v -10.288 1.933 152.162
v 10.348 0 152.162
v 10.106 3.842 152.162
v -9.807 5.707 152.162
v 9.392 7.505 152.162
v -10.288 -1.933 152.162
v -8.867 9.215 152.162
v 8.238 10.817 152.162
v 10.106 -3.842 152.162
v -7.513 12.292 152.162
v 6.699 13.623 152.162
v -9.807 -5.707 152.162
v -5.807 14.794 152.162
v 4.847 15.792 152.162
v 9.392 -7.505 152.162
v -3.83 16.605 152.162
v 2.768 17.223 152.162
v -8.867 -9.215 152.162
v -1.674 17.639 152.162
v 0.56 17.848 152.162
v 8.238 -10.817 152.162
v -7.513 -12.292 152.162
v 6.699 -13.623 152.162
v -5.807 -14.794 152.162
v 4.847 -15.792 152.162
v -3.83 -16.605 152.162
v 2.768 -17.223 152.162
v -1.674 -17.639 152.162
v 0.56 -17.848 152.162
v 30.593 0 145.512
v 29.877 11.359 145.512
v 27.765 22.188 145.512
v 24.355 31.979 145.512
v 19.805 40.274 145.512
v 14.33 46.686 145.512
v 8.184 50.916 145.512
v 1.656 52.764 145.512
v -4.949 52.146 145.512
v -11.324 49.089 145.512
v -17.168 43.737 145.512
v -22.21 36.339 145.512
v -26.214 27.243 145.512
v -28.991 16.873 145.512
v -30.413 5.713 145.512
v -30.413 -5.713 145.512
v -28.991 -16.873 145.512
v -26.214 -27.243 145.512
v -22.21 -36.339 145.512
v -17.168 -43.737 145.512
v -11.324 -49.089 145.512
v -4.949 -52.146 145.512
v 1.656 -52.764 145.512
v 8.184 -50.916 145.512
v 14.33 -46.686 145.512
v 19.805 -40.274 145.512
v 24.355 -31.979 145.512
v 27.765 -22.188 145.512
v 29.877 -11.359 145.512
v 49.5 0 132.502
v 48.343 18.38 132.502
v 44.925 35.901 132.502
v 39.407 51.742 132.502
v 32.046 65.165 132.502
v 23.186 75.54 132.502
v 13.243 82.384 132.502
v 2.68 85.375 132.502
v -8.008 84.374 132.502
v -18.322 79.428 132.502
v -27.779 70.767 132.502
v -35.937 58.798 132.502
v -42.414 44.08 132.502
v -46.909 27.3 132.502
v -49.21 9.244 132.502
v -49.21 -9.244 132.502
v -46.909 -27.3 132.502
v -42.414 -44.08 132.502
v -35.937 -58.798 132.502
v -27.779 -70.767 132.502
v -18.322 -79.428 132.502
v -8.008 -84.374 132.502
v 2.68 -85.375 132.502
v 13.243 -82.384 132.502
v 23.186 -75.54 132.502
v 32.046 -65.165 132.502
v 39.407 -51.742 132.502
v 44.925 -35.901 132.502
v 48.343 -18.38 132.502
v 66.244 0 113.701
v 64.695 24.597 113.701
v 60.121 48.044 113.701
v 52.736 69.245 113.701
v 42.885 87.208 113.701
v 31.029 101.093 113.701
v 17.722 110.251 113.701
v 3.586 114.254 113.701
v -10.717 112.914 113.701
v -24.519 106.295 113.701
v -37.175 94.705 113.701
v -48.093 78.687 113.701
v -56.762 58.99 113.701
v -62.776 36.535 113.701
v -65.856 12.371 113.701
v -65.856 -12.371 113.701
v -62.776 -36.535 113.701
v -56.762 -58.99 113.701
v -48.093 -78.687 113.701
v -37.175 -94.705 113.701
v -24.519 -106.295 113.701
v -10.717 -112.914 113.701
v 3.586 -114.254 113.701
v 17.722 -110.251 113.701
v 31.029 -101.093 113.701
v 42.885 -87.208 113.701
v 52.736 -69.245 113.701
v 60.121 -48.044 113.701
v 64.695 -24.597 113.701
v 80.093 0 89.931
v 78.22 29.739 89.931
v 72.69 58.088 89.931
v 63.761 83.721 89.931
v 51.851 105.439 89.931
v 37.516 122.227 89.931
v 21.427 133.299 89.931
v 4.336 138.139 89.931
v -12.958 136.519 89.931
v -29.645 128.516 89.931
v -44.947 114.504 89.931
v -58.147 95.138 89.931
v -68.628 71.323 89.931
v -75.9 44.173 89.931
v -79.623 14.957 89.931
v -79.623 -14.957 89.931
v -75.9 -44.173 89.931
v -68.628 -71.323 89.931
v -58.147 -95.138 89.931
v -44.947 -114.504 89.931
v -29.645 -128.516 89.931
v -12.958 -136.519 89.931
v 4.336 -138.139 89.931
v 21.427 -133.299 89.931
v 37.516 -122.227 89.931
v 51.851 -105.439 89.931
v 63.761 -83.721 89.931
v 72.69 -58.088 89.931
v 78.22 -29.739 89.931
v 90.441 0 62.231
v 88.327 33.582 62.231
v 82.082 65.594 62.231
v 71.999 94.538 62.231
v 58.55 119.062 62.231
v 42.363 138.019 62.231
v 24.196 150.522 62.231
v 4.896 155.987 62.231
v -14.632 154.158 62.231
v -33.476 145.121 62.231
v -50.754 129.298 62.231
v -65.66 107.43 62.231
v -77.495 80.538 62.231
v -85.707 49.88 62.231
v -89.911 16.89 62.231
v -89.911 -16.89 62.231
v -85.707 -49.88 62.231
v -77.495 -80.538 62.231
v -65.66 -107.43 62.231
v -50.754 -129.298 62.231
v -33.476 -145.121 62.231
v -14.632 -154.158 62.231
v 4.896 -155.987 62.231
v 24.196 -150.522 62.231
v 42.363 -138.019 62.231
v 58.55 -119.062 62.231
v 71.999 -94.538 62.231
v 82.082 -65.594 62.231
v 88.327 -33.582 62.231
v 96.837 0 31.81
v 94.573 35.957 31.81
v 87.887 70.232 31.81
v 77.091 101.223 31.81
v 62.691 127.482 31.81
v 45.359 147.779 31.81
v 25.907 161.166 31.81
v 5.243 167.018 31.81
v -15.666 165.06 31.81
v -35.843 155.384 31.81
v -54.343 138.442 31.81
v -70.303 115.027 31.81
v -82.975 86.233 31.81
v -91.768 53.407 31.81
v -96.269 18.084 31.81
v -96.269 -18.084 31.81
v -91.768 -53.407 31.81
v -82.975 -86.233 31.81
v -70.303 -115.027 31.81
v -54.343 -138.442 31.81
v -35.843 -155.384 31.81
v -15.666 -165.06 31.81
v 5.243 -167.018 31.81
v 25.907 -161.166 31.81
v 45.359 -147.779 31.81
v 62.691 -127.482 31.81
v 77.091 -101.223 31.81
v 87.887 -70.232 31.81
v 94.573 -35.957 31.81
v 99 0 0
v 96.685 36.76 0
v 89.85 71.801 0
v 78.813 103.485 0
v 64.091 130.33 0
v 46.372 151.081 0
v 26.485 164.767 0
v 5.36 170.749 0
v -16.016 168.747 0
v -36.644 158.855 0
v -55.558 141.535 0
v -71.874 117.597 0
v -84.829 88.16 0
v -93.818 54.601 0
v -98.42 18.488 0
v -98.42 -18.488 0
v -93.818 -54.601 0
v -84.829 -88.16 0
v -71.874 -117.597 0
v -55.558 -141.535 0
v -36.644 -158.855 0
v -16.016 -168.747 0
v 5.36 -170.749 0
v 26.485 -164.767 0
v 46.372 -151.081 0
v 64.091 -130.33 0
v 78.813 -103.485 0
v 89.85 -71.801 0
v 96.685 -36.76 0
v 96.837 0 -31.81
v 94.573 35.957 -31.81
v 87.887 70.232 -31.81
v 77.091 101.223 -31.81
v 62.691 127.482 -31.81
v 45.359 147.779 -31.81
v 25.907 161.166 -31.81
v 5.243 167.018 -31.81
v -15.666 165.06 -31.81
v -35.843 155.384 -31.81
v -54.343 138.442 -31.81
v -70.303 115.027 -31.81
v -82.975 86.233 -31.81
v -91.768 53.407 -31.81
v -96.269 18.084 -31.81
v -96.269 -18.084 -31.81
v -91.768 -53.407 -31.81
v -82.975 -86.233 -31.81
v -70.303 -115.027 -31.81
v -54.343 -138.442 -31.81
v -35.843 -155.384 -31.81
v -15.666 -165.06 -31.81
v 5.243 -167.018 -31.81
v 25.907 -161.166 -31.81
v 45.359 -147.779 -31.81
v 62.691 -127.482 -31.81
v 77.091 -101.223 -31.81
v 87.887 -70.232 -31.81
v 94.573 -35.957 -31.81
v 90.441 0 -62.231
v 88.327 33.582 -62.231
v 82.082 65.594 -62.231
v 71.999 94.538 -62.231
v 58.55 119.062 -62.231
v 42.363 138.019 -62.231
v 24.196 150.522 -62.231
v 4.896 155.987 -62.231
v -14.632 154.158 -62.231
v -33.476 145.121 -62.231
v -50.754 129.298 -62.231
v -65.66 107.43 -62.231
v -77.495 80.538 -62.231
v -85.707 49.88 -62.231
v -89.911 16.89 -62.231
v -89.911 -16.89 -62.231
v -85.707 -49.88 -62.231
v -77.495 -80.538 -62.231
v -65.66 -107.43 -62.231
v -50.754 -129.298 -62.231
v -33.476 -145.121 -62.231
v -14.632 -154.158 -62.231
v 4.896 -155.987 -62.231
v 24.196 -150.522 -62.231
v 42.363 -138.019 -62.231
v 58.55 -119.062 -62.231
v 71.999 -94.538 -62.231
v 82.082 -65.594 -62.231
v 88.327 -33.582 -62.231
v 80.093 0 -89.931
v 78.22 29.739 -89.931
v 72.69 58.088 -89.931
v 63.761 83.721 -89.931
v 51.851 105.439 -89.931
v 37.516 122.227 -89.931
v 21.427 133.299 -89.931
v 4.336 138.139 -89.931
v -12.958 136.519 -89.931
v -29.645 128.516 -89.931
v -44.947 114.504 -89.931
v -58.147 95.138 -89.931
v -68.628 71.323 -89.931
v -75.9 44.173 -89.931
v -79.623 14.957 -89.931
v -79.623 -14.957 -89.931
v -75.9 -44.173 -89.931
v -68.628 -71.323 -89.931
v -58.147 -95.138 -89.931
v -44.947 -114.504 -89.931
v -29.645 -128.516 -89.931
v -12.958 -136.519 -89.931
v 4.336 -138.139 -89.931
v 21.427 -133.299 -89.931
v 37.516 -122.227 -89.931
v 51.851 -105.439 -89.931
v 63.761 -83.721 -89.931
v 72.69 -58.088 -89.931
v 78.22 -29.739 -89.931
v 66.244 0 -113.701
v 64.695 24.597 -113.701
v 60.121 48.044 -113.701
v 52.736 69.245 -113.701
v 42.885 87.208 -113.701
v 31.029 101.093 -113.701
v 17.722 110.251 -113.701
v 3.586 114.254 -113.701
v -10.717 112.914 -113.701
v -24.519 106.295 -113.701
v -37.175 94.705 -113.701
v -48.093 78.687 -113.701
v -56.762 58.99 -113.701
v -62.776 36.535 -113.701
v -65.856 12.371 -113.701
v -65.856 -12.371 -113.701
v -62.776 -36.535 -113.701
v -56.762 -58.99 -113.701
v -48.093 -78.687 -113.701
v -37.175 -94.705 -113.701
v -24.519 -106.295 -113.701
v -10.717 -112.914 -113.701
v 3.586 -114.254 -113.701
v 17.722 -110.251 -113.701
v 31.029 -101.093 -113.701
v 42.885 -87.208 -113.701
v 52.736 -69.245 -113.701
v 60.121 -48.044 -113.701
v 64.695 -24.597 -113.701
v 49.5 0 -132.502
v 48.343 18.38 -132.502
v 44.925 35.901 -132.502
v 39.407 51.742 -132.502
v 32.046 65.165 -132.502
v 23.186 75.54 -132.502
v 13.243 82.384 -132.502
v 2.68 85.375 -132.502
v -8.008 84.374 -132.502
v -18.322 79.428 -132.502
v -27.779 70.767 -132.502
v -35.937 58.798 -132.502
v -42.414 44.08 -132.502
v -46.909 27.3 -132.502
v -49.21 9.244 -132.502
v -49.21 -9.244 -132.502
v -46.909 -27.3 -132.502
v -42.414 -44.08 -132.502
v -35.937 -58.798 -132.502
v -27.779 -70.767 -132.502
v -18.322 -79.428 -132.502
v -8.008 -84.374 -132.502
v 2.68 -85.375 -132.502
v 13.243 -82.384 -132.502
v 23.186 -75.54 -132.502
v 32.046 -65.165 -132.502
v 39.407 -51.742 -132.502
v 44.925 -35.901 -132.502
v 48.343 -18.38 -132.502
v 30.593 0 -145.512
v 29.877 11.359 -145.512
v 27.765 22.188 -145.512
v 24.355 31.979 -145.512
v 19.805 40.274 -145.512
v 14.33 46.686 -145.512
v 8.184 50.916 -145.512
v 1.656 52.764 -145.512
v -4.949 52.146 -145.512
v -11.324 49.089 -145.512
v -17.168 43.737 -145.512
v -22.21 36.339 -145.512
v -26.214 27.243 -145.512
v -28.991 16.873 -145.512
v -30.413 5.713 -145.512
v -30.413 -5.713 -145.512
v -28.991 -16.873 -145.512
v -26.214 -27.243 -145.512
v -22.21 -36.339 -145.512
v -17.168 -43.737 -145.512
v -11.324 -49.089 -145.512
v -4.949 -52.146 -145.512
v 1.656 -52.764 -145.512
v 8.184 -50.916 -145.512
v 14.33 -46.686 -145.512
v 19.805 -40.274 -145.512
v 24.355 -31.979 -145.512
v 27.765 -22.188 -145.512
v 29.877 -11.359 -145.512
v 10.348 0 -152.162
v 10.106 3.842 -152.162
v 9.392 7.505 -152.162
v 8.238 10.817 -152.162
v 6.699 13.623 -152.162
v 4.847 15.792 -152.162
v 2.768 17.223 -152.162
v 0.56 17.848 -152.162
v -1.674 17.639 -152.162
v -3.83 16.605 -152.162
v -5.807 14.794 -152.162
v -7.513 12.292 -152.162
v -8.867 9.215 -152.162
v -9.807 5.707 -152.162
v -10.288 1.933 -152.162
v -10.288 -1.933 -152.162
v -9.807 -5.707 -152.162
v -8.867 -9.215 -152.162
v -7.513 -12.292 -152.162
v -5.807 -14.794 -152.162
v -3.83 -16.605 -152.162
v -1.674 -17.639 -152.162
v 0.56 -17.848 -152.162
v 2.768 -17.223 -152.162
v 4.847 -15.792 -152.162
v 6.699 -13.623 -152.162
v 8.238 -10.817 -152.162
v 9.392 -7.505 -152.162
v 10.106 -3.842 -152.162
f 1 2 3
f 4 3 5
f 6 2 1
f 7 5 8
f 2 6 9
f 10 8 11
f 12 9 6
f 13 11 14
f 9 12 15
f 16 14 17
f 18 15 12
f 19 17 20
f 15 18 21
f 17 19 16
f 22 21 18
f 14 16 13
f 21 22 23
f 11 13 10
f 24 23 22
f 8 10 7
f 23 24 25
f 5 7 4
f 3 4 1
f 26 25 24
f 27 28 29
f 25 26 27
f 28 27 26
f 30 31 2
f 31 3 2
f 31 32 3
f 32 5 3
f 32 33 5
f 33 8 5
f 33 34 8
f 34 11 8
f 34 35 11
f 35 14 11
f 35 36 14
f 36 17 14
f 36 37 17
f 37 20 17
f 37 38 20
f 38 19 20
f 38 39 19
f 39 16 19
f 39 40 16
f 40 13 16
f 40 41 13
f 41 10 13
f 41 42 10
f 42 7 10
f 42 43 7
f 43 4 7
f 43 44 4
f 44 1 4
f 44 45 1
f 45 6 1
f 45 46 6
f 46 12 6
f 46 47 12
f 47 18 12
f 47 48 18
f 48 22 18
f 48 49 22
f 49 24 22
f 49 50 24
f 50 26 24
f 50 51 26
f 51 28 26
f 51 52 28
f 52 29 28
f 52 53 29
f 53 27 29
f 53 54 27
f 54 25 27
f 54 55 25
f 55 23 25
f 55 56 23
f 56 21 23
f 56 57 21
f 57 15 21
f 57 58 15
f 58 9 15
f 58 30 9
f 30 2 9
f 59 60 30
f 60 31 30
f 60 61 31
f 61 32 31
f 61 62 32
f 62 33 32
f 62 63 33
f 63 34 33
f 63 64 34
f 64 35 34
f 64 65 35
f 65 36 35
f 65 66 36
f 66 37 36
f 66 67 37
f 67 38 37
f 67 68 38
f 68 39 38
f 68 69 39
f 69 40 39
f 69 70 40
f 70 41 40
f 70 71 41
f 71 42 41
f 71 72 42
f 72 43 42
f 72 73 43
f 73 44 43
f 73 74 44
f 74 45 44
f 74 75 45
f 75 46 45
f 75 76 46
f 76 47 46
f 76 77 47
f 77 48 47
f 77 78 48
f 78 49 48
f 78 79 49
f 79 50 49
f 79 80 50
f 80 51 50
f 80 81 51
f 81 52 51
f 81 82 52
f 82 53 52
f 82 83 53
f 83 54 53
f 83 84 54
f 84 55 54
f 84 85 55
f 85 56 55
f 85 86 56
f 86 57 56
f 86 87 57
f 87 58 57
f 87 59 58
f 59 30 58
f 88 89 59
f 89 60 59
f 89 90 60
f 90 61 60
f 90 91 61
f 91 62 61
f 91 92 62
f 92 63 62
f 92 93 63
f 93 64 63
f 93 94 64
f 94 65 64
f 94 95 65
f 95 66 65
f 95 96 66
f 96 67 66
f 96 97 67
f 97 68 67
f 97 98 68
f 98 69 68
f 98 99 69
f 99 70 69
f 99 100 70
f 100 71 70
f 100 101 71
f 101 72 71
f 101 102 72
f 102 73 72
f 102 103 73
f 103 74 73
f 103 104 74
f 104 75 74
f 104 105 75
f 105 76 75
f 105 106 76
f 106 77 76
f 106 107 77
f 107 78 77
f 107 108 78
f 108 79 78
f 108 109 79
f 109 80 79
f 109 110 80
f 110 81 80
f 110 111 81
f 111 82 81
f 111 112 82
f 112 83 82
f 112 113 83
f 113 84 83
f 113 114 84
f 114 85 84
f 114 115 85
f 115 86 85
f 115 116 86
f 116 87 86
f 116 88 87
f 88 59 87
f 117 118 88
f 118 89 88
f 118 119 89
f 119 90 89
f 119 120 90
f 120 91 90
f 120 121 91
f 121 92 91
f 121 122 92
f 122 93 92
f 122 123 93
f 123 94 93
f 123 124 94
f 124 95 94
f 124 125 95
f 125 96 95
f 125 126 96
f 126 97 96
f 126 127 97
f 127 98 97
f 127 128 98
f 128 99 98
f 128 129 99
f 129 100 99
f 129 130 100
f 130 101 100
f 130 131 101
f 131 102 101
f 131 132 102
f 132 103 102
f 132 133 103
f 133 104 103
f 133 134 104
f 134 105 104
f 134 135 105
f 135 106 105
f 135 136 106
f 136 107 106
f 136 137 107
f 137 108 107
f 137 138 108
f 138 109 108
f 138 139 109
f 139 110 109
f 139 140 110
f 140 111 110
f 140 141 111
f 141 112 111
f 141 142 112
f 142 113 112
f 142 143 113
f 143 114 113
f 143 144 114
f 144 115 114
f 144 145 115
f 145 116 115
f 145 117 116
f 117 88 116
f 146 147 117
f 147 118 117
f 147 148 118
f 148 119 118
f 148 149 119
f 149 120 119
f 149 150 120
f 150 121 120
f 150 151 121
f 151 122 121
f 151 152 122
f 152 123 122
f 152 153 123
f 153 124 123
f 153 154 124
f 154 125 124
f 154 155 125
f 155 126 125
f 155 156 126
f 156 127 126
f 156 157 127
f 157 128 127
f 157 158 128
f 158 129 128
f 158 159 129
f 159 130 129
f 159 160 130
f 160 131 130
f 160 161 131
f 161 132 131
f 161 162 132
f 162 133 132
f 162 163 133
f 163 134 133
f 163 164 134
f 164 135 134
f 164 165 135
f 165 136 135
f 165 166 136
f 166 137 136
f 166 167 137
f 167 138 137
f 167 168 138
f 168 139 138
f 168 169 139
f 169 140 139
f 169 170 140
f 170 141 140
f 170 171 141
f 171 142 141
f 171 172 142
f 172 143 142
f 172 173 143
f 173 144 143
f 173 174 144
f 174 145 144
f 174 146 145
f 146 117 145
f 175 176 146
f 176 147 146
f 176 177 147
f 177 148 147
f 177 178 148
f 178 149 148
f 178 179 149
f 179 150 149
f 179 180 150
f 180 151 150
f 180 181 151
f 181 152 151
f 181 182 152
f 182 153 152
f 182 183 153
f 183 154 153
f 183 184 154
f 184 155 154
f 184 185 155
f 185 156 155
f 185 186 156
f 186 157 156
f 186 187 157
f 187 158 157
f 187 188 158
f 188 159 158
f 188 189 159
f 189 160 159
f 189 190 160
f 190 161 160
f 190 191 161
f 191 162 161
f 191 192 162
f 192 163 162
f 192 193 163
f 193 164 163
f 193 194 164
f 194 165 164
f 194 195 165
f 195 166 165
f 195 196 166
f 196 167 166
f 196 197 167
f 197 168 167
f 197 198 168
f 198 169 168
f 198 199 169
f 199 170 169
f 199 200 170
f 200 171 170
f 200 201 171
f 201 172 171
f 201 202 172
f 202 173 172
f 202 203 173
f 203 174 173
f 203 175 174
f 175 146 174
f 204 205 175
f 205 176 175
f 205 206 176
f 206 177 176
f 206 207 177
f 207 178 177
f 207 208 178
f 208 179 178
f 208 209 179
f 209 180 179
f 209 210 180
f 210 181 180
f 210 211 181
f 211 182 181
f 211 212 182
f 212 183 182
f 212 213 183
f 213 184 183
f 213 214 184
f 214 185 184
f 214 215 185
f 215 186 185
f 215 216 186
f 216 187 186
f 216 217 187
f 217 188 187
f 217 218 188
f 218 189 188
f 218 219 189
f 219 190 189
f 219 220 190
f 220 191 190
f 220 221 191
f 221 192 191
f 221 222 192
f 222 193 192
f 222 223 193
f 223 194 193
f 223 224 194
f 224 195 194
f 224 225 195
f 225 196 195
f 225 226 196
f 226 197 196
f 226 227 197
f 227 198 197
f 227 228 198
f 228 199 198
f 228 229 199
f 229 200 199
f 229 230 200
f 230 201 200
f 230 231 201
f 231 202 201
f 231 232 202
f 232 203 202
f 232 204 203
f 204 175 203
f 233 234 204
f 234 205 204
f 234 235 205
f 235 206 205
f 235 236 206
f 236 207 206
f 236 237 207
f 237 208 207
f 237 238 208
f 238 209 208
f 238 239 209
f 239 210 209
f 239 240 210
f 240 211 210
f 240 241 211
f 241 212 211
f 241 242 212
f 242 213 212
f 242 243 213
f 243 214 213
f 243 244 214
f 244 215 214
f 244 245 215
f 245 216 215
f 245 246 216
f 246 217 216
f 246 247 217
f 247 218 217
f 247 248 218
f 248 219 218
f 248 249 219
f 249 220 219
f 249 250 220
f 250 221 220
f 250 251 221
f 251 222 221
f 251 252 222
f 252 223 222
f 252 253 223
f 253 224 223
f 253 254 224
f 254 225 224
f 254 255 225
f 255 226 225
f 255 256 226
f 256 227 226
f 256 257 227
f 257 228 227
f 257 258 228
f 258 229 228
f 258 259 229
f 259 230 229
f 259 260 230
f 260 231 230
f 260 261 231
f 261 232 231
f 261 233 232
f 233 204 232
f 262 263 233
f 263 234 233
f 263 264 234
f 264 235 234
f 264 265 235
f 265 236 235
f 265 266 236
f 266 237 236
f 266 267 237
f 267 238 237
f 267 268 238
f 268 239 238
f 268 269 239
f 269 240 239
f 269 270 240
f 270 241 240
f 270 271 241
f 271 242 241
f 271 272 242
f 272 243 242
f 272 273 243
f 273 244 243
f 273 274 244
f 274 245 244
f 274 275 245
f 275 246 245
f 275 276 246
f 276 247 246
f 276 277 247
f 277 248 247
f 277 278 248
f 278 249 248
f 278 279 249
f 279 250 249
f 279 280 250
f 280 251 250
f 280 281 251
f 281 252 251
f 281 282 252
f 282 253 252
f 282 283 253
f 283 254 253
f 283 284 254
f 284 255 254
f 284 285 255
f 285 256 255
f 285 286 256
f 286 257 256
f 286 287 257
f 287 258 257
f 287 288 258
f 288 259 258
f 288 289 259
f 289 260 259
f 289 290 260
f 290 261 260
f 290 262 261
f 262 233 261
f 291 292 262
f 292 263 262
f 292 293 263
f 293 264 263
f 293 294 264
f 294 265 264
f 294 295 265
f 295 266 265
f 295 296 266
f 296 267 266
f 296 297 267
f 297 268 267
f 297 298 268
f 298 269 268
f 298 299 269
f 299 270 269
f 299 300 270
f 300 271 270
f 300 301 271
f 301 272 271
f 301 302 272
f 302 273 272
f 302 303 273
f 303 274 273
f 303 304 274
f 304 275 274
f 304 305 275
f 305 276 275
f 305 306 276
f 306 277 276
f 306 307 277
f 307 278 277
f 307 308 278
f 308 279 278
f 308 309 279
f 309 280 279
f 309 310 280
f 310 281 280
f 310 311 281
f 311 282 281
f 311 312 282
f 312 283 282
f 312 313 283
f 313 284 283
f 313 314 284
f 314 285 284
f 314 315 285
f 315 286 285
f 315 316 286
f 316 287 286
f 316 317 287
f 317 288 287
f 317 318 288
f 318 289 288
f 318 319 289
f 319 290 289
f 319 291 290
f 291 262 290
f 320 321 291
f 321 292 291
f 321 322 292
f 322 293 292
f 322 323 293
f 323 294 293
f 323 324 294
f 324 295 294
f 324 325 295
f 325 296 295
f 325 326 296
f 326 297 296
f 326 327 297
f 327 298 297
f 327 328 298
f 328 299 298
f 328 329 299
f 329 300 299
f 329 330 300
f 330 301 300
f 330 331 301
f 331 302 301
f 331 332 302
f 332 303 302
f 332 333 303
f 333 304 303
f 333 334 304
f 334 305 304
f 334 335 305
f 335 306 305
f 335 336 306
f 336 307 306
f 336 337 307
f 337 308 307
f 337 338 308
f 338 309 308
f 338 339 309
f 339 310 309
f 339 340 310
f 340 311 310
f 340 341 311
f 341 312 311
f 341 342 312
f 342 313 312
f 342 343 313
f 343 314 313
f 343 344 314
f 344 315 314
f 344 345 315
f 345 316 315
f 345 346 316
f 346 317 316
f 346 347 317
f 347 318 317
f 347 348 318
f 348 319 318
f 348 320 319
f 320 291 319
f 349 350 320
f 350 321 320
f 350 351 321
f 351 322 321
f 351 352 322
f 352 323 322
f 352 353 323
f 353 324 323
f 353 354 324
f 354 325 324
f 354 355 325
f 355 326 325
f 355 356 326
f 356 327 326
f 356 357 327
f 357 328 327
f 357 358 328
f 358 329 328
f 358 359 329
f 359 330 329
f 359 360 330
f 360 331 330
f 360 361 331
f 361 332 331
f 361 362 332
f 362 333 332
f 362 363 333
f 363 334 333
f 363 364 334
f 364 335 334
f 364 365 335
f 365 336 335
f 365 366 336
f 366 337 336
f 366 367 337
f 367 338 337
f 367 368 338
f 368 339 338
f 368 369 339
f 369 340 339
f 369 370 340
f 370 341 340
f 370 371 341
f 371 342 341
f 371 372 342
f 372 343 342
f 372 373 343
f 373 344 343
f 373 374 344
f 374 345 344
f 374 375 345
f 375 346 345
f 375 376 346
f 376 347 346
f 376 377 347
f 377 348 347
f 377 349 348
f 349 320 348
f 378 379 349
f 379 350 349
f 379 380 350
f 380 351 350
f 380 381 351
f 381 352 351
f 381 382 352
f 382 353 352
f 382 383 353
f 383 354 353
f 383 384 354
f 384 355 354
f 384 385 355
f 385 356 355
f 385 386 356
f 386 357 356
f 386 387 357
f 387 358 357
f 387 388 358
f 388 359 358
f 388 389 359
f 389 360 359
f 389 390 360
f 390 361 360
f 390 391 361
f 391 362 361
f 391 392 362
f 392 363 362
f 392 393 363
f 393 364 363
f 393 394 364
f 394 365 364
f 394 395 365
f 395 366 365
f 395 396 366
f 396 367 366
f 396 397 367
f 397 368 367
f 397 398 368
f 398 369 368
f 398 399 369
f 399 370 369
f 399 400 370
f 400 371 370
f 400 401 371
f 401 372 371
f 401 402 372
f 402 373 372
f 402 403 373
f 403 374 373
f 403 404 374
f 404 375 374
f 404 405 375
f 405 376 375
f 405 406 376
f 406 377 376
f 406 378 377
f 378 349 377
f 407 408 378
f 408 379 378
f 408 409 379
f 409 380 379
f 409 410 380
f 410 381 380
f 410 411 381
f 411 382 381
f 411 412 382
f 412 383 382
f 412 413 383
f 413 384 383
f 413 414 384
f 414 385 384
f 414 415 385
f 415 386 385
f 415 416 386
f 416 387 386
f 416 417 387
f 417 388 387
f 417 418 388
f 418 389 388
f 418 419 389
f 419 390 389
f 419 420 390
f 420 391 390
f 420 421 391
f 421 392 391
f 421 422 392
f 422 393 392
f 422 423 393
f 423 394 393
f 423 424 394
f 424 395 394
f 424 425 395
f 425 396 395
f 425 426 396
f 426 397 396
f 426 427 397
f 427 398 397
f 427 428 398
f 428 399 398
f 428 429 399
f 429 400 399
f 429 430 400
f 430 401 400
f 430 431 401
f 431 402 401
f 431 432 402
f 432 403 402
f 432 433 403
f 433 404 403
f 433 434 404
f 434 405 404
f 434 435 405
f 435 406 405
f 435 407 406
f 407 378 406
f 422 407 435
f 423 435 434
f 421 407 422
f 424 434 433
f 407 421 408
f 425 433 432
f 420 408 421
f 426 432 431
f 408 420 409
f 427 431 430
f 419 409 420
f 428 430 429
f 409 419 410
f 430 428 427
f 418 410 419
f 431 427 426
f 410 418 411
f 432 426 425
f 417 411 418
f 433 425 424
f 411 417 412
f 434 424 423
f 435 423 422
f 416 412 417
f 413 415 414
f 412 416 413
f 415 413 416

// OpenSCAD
// Generated by SolidPython 1.0.1 on 2020-07-29 00:46:50


scale(v = [11, 19, 17]) {
	sphere(r = 9);
}
/***********************************************
*********      SolidPython code:      **********
************************************************
 
# import packages: SolidPython
from solid import *
from solid.utils import *
from itertools import chain, combinations, permutations


class Resize:

    def __init__(self, scad_file):
        self.scad_file = scad_file
        #self.scad_file = import_scad(scad_file)
        # cone/cylinder param:
        self.r1 = 0
        self.r2 = 0
        self.h = 0
        # rectangular prism param:
        self.w = 0
        self.l = 0
        # ellipse param:
        self.r = 0

    # import OpenScad code (file name corresponds to shape)


    # classify shape + parameters
    def assign(self, param1, param2, param3):
        if self.scad_file == 'cone.scad':
            self.r1 = param1
            self.r2 = param2
            self.h = param3
        elif self.scad_file == 'cylinder.scad':
            self.r1 = param1
            self.r2 = param2
            self.h = param3
        elif self.scad_file == 'rectangularPrism.scad':
            self.h = param1
            self.l = param2
            self.w = param3
        else:
            self.r = param1
            self.h = param2

    # resize parameters
    def iterate(self):
        x = range(3, 20, 2)
        i = 1
        if self.scad_file == 'cone.scad':
            tempList = list(permutations(x, 2))
            for temp in tempList:
                param1 = temp[0]
                param2 = temp[1]
                filepath = 'produced_scad_files/' + 'cone' + str(param1) + '_' + str(param2) + '_' + '.scad'
                scad_render_to_file(cylinder(h=param1, r1=param2, r2=0), filepath)

        elif self.scad_file == 'cylinder.scad':
            tempList = list(permutations(x, 3))
            for temp in tempList:
                param1 = temp[0]
                param2 = temp[1]
                filepath = 'produced_scad_files/' + 'cylinder' + str(param1) + '_' + str(param2) + '_' + '.scad'
                scad_render_to_file(cylinder(h=param1, r1=param2, r2=param2), filepath)

        elif self.scad_file == 'rectangularPrism.scad':
            tempList = list(permutations(x, 3))
            for temp in tempList:
                param1 = temp[0]
                param2 = temp[1]
                param3 = temp[2]
                filepath = 'produced_scad_files/' + 'rectangularPrism' + str(param1) + '_' + str(param2) + '_' + str(
                    param3) + '.scad'
                scad_render_to_file(cube(size=(param1, param2, param3)), filepath)

        elif self.scad_file == 'ellipse.scad':
            tempList = list(permutations(x, 4))
            for temp in tempList:
                param1 = temp[0]
                param2 = temp[1]
                param3 = temp[2]
                param4 = temp[3]
                filepath = 'produced_scad_files/' + 'ellipse' + str(param1) + '_' + str(param2) + '_' + str(param3) + '_' + str(param4) + '.scad'
                scad_render_to_file(scale([param1, param2, param3])(sphere(r=param4)), filepath)

    def render_to_scadfile(self):
        scad_render_to_file(scad, 'example.scad') 
 
************************************************/
